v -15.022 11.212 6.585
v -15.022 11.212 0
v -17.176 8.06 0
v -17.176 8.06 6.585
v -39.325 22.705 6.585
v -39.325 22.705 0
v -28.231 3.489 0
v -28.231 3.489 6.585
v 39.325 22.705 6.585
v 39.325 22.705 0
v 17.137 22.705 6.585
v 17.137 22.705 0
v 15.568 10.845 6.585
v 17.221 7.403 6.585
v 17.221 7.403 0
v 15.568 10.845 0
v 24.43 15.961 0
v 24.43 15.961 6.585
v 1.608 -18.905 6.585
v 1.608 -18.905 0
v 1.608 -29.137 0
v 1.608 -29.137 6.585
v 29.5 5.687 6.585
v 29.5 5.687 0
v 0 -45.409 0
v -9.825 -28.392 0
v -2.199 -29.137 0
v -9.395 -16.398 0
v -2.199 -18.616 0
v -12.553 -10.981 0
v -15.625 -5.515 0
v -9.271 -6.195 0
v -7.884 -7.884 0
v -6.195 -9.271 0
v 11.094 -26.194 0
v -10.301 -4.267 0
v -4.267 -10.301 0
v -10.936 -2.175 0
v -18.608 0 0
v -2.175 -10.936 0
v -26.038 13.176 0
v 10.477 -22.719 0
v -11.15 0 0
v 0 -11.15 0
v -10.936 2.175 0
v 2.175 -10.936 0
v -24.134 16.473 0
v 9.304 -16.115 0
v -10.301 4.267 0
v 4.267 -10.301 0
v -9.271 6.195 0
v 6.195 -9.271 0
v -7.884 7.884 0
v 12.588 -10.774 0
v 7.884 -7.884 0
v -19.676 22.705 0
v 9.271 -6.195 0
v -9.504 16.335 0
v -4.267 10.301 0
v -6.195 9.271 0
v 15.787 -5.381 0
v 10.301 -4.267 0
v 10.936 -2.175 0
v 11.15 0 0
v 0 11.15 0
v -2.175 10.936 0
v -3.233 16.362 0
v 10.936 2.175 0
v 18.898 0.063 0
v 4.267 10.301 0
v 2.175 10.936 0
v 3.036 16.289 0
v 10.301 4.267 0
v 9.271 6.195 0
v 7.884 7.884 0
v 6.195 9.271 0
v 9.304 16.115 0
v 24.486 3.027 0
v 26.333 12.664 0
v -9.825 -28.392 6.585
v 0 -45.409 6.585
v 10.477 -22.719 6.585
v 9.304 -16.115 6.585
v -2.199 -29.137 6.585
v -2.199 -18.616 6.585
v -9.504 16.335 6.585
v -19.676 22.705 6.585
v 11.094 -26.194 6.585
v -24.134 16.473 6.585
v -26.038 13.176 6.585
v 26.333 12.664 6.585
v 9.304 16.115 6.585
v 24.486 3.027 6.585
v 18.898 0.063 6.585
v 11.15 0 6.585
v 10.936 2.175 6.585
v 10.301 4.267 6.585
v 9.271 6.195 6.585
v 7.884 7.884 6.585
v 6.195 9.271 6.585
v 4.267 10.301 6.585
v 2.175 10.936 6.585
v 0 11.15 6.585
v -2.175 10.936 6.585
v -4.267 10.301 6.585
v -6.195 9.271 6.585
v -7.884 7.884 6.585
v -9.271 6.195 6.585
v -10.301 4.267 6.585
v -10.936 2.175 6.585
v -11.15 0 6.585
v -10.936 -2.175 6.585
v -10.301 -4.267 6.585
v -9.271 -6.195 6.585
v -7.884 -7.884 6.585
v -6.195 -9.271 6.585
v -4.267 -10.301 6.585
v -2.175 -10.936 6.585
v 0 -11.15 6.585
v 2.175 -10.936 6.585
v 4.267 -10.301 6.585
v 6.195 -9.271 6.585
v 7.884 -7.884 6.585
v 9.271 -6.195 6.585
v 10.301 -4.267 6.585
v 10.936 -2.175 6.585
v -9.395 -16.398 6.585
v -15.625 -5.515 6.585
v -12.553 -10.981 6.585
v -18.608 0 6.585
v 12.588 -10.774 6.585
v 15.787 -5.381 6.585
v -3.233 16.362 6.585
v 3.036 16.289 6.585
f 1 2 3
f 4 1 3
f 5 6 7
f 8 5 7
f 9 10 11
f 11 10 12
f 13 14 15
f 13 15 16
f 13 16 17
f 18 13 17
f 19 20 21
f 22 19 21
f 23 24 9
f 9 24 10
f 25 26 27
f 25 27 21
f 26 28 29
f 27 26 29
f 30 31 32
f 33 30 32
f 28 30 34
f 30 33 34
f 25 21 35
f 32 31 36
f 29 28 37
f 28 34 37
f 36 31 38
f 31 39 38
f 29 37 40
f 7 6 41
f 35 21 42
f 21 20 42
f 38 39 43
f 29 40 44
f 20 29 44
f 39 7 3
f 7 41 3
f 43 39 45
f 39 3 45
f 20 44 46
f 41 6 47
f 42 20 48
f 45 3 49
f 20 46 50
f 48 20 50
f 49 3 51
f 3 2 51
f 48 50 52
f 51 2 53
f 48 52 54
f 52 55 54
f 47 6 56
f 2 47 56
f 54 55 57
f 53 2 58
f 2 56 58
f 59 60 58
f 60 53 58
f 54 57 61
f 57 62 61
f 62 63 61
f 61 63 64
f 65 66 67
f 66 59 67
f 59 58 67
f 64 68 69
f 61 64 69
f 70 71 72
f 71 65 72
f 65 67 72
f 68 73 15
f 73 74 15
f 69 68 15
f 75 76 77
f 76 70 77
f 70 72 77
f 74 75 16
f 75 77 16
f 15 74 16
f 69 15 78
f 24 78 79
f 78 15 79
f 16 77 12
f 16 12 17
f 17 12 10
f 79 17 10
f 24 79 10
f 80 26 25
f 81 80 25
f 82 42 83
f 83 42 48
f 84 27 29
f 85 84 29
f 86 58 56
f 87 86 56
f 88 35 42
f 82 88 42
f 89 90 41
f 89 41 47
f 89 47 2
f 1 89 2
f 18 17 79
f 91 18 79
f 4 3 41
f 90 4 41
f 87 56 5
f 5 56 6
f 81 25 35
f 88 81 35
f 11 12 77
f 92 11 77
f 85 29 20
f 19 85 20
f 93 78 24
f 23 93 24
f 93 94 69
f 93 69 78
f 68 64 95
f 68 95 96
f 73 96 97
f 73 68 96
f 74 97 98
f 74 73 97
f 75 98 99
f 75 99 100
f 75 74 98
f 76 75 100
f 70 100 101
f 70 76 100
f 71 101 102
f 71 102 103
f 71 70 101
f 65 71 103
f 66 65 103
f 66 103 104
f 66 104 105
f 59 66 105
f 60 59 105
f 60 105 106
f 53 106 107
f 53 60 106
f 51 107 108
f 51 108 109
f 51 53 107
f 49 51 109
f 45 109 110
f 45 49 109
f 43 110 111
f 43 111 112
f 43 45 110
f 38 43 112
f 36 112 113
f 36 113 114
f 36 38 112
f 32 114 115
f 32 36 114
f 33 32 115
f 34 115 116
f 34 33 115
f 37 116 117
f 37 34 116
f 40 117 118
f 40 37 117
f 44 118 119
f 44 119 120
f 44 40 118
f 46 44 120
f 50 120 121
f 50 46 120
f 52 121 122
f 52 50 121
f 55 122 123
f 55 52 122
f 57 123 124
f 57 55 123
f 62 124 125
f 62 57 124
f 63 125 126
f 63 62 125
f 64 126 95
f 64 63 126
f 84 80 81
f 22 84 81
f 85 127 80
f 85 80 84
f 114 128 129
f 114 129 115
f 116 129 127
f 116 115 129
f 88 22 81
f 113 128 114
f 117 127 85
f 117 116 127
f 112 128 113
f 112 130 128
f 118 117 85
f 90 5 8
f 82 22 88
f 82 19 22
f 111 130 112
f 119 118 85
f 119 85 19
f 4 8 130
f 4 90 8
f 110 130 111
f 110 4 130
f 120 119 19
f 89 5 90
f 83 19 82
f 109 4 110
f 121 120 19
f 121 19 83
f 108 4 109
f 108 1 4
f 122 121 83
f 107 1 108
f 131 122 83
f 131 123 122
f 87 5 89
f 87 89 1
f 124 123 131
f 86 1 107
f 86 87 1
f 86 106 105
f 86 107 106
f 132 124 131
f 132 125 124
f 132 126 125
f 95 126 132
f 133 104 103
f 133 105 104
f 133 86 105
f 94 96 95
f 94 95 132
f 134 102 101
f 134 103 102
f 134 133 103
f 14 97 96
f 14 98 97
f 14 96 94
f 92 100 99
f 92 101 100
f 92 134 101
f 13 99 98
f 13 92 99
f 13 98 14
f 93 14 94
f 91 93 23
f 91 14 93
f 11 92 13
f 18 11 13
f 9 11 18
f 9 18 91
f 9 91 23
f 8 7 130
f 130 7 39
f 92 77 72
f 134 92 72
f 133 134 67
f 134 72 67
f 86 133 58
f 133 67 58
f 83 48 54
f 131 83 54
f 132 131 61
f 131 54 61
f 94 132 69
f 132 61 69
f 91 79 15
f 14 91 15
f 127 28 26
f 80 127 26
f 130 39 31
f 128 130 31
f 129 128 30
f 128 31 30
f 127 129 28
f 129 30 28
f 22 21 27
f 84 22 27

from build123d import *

# Parameters (mm, degrees)
F0_R     = 11.15
F1_DEPTH = 6.585
F3_DEPTH = 25


with BuildPart() as f1:
    # F0 (on Top) → F1 (new body)
    with BuildSketch(Plane.XY):
        with BuildLine():
            Line((-9.824942, -28.391755), (0, -45.409054))
            Line((0, -45.409054), (11.093962, -26.193747))
            Line((11.093962, -26.193747), (10.476884, -22.719322))
            Line((10.476884, -22.719322), (9.30388, -16.114792))
            ThreePointArc((9.30388, -16.114792), (14.198421, -8.08372), (18.898248, 0.062829))
            Line((18.898248, 0.062829), (24.486244, 3.027224))
            Line((24.486244, 3.027224), (29.500452, 5.687228))
            Line((29.500452, 5.687228), (39.325394, 22.704527))
            Line((39.325394, 22.704527), (17.137469, 22.704527))
            Line((17.137469, 22.704527), (9.30388, 16.114792))
            ThreePointArc((9.30388, 16.114792), (-0.098503, 16.338053), (-9.503536, 16.334949))
            Line((-9.503536, 16.334949), (-19.67551, 22.704527))
            Line((-19.67551, 22.704527), (-39.325394, 22.704527))
            Line((-39.325394, 22.704527), (-28.231432, 3.48922))
            Line((-28.231432, 3.48922), (-18.607759, 0))
            ThreePointArc((-18.607759, 0), (-14.099918, -8.254333), (-9.394713, -16.397778))
            Line((-9.394713, -16.397778), (-9.824942, -28.391755))
        make_face()
        Circle(F0_R, mode=Mode.SUBTRACT)
    extrude(amount=F1_DEPTH)

    # F2 (on face) → F3 (cut)
    with BuildSketch(Plane(origin=(0, 0, 0), x_dir=(1, 0, 0), z_dir=(0, 0, -1))):
        Polygon((-2.199187, 29.137347), (-2.199187, 18.615887), (1.608272, 18.904826), (1.608272, 29.137347), align=None)
        Polygon((-24.134089, -16.473225), (-15.022237, -11.212495), (-17.176195, -8.059608), (-26.037819, -13.175869), align=None)
        Polygon((26.333276, -12.664122), (17.221424, -7.403392), (15.567923, -10.845217), (24.429547, -15.961478), align=None)
    extrude(amount=-F3_DEPTH, mode=Mode.SUBTRACT)


solid = f1.part
